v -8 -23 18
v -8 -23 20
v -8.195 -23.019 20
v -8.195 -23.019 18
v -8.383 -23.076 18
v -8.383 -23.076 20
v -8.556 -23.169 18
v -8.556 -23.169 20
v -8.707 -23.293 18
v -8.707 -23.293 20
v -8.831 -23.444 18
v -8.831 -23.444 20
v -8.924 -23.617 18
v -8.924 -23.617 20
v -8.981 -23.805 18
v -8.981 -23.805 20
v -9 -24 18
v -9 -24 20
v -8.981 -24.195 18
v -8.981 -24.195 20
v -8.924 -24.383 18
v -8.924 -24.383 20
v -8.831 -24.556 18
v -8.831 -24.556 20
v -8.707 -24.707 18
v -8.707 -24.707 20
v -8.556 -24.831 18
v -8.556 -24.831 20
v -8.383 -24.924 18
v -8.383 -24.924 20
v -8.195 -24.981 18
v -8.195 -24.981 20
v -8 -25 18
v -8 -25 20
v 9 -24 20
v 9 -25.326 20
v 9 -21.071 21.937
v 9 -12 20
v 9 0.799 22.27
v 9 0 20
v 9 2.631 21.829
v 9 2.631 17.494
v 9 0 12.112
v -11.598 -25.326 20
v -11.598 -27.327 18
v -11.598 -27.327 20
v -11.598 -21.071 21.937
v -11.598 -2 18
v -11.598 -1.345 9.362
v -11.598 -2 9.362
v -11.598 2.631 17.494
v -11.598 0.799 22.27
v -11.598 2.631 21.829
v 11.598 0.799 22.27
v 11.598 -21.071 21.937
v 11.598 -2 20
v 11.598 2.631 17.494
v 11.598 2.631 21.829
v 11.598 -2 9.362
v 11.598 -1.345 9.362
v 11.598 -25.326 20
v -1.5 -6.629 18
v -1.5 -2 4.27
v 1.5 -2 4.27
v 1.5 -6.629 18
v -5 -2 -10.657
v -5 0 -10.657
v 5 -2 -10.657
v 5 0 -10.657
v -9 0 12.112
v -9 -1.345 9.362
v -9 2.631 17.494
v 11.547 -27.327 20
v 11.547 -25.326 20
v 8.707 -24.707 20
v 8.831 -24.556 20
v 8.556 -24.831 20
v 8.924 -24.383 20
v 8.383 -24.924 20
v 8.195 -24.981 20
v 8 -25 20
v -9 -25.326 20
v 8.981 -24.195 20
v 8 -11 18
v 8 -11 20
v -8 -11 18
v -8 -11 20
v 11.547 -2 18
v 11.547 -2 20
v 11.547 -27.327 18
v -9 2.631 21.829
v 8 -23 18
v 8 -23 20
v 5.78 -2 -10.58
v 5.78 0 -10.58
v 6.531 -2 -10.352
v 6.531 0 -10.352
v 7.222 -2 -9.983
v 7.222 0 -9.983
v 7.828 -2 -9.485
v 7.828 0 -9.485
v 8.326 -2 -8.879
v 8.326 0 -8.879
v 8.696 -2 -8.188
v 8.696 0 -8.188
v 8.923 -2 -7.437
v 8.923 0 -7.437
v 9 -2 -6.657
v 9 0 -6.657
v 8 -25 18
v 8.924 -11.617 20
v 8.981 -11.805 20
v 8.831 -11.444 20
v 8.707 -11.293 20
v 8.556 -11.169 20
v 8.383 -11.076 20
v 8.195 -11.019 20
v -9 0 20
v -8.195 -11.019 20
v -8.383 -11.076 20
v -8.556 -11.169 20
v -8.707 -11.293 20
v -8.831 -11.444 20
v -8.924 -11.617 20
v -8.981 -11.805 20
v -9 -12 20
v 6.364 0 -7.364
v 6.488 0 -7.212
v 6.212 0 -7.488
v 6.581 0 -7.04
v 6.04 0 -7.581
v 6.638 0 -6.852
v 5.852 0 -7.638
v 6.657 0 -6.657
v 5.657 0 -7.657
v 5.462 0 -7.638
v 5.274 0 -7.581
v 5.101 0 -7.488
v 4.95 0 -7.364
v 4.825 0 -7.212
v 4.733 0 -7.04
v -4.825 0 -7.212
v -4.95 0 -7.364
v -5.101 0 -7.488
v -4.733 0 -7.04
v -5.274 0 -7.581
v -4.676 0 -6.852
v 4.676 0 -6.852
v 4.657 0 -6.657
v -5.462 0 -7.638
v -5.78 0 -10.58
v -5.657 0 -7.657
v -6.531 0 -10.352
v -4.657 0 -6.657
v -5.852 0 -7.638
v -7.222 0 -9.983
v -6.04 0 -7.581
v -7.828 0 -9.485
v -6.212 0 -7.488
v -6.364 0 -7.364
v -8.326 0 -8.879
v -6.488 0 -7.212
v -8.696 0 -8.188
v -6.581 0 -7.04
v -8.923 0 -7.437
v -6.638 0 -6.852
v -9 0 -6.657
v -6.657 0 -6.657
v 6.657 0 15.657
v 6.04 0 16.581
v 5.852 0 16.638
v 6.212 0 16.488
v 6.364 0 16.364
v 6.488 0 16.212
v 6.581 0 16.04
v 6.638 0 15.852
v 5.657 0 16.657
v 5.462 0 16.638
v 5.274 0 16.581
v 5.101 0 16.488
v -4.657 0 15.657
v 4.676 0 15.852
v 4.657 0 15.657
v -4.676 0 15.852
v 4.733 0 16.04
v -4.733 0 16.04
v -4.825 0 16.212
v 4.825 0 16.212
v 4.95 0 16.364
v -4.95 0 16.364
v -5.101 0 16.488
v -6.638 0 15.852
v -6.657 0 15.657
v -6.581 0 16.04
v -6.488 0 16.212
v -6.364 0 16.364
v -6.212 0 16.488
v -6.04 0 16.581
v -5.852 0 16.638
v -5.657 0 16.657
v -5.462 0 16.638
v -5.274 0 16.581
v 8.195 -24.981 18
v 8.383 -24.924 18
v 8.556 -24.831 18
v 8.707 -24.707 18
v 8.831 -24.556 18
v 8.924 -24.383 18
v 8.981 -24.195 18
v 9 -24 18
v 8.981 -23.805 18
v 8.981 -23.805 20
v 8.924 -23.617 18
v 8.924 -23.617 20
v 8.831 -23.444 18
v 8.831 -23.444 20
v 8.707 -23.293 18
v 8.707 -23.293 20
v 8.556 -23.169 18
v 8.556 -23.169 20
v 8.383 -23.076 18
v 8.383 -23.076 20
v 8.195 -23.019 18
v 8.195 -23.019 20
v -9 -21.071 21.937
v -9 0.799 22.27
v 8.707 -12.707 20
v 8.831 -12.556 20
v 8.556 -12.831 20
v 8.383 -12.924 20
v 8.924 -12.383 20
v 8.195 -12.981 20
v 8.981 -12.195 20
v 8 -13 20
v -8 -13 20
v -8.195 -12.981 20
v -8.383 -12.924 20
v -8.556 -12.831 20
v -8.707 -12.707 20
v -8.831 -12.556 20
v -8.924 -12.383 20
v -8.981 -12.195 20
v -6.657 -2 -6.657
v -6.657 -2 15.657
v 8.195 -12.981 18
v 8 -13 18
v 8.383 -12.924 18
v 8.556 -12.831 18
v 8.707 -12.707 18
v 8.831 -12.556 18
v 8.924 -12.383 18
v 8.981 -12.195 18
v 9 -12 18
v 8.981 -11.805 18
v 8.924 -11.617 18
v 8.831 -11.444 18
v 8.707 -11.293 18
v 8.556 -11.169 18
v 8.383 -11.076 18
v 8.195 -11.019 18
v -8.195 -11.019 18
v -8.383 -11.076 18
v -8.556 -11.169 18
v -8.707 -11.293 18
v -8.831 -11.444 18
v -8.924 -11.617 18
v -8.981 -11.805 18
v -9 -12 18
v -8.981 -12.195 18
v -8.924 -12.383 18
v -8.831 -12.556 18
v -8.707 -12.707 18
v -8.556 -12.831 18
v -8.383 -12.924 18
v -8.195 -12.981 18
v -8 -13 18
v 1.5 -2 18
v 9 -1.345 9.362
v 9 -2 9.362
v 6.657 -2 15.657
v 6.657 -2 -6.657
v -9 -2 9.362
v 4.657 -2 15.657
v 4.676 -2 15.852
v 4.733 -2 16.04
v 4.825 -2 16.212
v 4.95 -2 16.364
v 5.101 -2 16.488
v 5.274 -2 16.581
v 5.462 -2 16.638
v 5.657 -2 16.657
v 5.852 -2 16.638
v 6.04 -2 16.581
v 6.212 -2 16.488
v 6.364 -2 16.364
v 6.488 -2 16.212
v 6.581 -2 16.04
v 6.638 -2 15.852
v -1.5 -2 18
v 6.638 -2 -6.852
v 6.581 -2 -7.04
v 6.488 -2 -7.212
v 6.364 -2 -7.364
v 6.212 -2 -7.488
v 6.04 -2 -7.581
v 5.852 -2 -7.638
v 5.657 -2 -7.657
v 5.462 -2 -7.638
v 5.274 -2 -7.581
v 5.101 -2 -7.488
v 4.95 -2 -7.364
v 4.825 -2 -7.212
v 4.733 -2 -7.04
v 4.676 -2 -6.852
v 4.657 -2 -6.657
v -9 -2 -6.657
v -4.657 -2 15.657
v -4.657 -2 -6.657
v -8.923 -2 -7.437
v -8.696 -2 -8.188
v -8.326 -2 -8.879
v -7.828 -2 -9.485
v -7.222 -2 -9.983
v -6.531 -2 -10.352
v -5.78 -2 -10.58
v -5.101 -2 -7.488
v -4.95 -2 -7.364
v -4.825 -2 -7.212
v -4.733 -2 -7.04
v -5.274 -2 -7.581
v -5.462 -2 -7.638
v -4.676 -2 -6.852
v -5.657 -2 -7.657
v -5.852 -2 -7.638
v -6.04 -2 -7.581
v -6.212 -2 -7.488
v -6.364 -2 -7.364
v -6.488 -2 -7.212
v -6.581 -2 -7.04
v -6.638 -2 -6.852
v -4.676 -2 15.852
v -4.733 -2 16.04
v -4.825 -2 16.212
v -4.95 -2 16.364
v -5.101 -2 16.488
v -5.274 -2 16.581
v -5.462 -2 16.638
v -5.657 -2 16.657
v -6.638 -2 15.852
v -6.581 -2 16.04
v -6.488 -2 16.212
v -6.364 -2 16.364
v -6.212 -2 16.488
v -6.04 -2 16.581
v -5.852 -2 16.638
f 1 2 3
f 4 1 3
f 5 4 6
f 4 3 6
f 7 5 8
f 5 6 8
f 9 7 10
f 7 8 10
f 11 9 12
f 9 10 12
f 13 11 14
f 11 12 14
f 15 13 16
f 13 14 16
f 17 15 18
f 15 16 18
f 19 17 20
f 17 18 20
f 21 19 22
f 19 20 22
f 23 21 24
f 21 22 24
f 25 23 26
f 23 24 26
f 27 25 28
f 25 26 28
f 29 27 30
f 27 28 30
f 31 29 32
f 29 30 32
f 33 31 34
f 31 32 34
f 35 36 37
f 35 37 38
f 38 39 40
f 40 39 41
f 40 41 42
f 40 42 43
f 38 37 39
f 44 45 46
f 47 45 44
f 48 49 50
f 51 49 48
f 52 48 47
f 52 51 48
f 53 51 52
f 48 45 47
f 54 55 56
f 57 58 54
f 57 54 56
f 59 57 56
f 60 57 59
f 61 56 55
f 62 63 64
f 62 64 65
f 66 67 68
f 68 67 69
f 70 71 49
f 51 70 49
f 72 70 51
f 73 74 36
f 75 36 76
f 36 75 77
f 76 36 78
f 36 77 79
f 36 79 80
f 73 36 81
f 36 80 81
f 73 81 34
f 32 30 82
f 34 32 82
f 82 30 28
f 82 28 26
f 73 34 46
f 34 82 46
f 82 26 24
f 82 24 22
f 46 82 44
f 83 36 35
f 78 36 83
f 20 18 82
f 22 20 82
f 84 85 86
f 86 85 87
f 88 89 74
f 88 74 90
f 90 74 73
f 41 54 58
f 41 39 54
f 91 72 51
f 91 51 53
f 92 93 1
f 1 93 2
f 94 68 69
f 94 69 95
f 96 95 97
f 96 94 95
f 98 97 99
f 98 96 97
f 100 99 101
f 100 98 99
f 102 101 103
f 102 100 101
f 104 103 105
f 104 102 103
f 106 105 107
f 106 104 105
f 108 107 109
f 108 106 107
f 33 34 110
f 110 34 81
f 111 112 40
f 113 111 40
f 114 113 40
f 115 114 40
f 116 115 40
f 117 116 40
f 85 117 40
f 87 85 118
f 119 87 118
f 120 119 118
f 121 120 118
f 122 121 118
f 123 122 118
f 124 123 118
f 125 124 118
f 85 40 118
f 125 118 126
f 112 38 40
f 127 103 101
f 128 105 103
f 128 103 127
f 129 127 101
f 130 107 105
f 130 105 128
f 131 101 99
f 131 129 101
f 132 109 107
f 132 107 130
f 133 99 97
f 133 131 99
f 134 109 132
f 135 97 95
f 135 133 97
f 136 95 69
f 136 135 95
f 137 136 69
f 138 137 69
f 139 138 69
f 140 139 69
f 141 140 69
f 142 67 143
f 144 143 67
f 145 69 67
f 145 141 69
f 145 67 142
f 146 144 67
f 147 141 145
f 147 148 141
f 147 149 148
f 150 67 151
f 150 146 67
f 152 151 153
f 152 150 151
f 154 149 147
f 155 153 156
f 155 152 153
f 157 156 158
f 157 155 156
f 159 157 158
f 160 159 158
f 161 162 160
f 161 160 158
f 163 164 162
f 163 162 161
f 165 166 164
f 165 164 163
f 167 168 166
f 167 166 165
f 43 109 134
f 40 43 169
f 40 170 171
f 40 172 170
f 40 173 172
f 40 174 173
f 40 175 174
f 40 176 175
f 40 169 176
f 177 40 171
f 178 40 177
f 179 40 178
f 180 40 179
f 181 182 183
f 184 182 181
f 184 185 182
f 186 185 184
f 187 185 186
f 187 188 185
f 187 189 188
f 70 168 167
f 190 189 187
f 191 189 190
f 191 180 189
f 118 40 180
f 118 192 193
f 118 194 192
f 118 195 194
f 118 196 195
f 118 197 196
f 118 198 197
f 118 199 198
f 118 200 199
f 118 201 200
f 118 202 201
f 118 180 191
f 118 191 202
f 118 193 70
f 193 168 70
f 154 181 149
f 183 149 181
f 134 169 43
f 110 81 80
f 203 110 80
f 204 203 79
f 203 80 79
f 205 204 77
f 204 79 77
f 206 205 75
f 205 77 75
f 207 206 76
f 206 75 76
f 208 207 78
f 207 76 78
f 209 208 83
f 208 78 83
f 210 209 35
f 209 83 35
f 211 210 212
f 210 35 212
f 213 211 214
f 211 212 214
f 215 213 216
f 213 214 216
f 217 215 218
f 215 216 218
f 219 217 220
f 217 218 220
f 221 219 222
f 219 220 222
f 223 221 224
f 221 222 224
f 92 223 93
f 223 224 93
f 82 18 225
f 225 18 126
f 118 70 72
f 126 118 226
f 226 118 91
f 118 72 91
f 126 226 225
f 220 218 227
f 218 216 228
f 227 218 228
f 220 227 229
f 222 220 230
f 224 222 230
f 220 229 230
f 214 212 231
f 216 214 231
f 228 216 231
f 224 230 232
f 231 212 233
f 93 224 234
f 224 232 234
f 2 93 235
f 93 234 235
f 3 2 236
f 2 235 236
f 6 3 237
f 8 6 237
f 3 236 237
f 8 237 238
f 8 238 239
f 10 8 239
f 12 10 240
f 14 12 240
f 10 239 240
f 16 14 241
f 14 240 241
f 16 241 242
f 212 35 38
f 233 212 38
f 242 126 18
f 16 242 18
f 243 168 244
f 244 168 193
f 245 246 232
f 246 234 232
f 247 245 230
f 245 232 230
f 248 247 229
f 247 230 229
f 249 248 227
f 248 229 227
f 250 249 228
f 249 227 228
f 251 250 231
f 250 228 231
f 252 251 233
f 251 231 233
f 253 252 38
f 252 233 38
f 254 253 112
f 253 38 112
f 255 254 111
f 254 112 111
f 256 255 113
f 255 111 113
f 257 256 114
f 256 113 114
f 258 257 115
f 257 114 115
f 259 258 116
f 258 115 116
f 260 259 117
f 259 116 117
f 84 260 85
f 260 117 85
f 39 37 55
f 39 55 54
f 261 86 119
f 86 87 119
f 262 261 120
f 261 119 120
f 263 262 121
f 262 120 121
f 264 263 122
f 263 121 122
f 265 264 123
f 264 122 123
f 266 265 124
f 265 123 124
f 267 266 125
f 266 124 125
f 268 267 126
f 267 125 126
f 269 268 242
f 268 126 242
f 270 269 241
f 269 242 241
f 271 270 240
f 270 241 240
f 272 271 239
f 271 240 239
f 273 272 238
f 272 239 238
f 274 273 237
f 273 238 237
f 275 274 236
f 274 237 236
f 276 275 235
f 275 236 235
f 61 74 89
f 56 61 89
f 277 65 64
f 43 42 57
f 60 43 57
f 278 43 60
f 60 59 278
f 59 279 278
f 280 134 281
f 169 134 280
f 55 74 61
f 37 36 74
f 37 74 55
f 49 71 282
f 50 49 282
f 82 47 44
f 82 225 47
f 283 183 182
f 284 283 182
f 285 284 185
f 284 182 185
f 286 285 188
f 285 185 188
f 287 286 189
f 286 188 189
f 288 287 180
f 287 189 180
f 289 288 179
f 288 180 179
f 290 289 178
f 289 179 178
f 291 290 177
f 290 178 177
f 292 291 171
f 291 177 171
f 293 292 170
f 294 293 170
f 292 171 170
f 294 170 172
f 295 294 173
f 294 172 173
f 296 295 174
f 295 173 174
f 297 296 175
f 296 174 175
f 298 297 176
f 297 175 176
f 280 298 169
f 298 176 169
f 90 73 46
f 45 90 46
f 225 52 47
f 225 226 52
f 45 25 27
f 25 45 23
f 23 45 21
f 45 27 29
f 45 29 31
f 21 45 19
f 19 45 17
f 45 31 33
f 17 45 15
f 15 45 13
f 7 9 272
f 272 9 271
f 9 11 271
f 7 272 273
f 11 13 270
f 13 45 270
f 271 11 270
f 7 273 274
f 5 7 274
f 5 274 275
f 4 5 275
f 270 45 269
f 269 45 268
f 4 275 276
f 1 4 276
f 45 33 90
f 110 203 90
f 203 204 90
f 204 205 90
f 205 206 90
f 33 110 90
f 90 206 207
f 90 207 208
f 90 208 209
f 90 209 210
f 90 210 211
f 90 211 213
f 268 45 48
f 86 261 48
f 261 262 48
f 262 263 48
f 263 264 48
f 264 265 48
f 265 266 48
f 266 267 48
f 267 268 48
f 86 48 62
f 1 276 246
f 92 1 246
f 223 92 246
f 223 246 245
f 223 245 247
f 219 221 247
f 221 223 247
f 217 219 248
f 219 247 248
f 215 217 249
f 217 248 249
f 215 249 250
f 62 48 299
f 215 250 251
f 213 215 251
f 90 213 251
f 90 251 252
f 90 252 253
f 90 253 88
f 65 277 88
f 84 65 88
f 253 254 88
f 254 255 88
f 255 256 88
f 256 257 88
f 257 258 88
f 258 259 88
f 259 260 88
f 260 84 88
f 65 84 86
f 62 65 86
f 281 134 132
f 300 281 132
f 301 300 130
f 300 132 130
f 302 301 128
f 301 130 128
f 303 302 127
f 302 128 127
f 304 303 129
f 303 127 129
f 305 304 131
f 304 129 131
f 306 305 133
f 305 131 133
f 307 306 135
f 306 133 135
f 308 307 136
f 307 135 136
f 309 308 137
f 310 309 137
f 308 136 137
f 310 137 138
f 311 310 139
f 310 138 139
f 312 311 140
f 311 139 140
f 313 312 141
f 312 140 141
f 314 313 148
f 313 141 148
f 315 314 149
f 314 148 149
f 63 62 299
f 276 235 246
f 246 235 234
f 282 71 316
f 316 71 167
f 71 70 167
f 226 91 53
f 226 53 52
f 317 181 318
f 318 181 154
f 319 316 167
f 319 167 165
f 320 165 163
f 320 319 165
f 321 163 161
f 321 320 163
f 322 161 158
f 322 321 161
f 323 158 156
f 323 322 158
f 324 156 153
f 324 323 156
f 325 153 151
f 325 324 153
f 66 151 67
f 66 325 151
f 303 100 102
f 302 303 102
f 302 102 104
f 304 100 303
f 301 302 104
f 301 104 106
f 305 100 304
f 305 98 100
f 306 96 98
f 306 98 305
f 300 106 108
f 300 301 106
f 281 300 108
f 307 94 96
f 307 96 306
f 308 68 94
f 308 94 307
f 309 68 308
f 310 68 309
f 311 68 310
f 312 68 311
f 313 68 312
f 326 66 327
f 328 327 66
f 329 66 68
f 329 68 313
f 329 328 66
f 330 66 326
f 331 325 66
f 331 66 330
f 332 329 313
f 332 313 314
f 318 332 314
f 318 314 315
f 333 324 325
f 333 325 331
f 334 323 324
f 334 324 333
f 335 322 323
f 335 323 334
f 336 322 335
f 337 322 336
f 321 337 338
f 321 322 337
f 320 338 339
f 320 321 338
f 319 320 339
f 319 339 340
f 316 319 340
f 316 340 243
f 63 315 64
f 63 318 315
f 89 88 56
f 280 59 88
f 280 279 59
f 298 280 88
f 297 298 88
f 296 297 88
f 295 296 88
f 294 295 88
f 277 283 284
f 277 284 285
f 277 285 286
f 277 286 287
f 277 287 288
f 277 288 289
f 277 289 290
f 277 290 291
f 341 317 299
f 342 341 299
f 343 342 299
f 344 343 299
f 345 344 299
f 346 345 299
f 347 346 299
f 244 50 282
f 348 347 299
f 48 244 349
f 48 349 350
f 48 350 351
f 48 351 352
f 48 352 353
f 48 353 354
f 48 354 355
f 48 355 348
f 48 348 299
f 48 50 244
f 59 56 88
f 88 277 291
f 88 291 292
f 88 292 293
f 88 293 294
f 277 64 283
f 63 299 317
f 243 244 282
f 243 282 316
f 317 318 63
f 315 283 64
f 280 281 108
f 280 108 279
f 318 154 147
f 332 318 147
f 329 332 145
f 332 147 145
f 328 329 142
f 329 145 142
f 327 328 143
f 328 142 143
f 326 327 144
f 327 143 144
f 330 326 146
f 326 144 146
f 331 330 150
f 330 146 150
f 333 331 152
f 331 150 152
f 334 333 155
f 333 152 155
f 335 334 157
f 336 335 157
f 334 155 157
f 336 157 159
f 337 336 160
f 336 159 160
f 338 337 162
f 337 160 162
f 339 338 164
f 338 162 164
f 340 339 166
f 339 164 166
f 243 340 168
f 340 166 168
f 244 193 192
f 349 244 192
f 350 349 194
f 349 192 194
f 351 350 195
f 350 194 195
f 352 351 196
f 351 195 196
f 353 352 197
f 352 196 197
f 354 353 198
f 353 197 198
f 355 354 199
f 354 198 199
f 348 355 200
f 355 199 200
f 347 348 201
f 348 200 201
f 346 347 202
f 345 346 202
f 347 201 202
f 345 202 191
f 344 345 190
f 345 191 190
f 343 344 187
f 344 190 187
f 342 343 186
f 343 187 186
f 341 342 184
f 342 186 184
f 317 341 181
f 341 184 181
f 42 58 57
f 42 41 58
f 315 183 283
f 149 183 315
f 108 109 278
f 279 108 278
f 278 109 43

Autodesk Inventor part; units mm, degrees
ref_plane "XY Plane" through (0, 0, 0) normal (0, 0, 1) x (1, 0, 0)
sketch "Sketch1" plane through (0, 0, 0) normal (0, 1, 0) x (-1, 0, 0)
  line L0 (-9, 20) -> (9, 20)
  line L1 (9, 20) -> (9, -10.6569)
  line L2 (9, -10.6569) -> (-9, -10.6569)
  line L3 (-9, -10.6569) -> (-9, 20)
  line L4 (-9, 20) -> (9, -10.6569) construction
  line L5 (9, 20) -> (-9, -10.6569) construction
  line L6 (0, -28.0453) -> (0, 28.0076) construction
  line L7 (-14.8076, 0) -> (25.8453, 0) construction
  line L8 (0, 0) -> (20.0378, -20.0378) construction
  line L9 (5.6569, -7.6569) -> (5.6569, 16.6569) construction
  line L10 (6.6569, -6.6569) -> (6.6569, 15.6569)
  line L11 (4.6569, 15.6569) -> (4.6569, -6.6569)
  arc A0 (4.6569, -6.6569) -> (6.6569, -6.6569) centre (5.6569, -6.6569) ccw
  arc A1 (6.6569, 15.6569) -> (4.6569, 15.6569) centre (5.6569, 15.6569) ccw
  line L12 (0, 0) -> (13.8345, 13.8345) construction
  line L13 (-5.6569, -7.6569) -> (-5.6569, 16.6569) construction
  line L14 (-6.6569, -6.6569) -> (-6.6569, 15.6569)
  line L15 (-4.6569, 15.6569) -> (-4.6569, -6.6569)
  arc A2 (-6.6569, -6.6569) -> (-4.6569, -6.6569) centre (-5.6569, -6.6569) ccw
  arc A3 (-4.6569, 15.6569) -> (-6.6569, 15.6569) centre (-5.6569, 15.6569) ccw
  point P0 (0, 4.6716)
  point P1 (0, 4.6716)
  point P2 (5.6569, -5.6569)
  point P3 (5.6569, 4.5)
  point P4 (5.6569, 5.6569)
  point P5 (-5.6569, -5.6569)
  point P6 (-5.6569, 4.5)
  point P7 (-5.6569, 5.6569)
  dimension "d34" = 18
  dimension "d35" = 45
  dimension "d36" = 8
  dimension "d37" = 2
  dimension "d38" = 1
  dimension "d40" = 45
  dimension "d41" = 10
  dimension "d42" = 4
  dimension "d43" = 20
extrude "Extrusion1" add sketch "Sketch1" against normal blind 2
sketch "Sketch5" plane through (-9, 0, 20) normal (0, 0, 1) x (1, 0, 0)
  line L0 (-2.5982, 0) -> (20.5467, 0)
  line L1 (20.5467, 0) -> (20.5467, -27.3268)
  line L2 (20.5467, -27.3268) -> (-2.5982, -27.3268)
  line L3 (-2.5982, -27.3268) -> (-2.5982, 0)
  line L4 (18, 0) -> (18, -2) construction
  line L5 (0, 0) -> (0, -2) projected
  line L6 (1, -24) -> (17, -24) construction
  line L7 (1, -25) -> (17, -25)
  line L8 (17, -23) -> (1, -23)
  arc A0 (1, -23) -> (1, -25) centre (1, -24) ccw
  arc A1 (17, -25) -> (17, -23) centre (17, -24) ccw
  line L9 (1, -12) -> (17, -12) construction
  line L10 (1, -13) -> (17, -13)
  line L11 (17, -11) -> (1, -11)
  arc A2 (1, -11) -> (1, -13) centre (1, -12) ccw
  arc A3 (17, -13) -> (17, -11) centre (17, -12) ccw
  line L12 (0, -2) -> (18, -2) projected
  point P0 (9, 0)
  point P1 (9, -24)
  point P2 (9, -12)
  dimension "d56" = 2
  dimension "d57" = 2
  dimension "d58" = 12
  dimension "d59" = 8
  dimension "d62" = 10
extrude "Extrusion5" add sketch "Sketch5" against normal blind 2
ref_plane "Work Plane1" through (-8, -18, 20) normal (0, -1, 0) x (1, 0, 0)
fillet "Fillet2" radius 4 2 edges at (-9, -1, -10.6569) (9, -1, -10.6569)
sketch "Sketch6" plane through (0, 0, 0) normal (1, 0, 0) x (0, 1, 0)
  line L0 (-2, 4.2697) -> (-6.6287, 18)
  line L1 (-6.6287, 18) -> (-2, 18)
  line L2 (-2, 18) -> (-2, -6.6569) projected
  line L3 (-2, 18) -> (-2, 4.2697)
  point P0 (0, 0)
extrude "Extrusion6" add sketch "Sketch6" along normal mid plane 3
sketch "Sketch7" plane through (-9, -2, 18) normal (-1, 0, 0) x (0, 0, 1)
  line L0 (-8.6385, 0.6553) -> (-0.5065, 4.6311)
  line L1 (-0.5065, 4.6311) -> (3.8294, 4.6311)
  line L2 (3.8294, 4.6311) -> (4.27, 2.7989)
  line L3 (4.27, 2.7989) -> (3.937, -19.0711)
  line L4 (3.937, -19.0711) -> (2, -23.3264)
  line L5 (-8.6385, 0.6553) -> (-8.6385, 0)
  line L6 (2, 0) -> (2, -23.3264)
  line L7 (2, 0) -> (-8.6385, 0)
  line L8 (0, 0) -> (-24.6569, 0) projected
  point P0 (-18, 2)
  point P1 (2, 2)
extrude "Extrusion7" add sketch "Sketch7" along normal up to surface (2.5982 mm away)
mirror "Mirror1" about plane through (0, 0, 0) normal (1, 0, 0) of "Extrusion7"
properties part number "gimbal_pitch_brushless" material "ABS Plastic"
